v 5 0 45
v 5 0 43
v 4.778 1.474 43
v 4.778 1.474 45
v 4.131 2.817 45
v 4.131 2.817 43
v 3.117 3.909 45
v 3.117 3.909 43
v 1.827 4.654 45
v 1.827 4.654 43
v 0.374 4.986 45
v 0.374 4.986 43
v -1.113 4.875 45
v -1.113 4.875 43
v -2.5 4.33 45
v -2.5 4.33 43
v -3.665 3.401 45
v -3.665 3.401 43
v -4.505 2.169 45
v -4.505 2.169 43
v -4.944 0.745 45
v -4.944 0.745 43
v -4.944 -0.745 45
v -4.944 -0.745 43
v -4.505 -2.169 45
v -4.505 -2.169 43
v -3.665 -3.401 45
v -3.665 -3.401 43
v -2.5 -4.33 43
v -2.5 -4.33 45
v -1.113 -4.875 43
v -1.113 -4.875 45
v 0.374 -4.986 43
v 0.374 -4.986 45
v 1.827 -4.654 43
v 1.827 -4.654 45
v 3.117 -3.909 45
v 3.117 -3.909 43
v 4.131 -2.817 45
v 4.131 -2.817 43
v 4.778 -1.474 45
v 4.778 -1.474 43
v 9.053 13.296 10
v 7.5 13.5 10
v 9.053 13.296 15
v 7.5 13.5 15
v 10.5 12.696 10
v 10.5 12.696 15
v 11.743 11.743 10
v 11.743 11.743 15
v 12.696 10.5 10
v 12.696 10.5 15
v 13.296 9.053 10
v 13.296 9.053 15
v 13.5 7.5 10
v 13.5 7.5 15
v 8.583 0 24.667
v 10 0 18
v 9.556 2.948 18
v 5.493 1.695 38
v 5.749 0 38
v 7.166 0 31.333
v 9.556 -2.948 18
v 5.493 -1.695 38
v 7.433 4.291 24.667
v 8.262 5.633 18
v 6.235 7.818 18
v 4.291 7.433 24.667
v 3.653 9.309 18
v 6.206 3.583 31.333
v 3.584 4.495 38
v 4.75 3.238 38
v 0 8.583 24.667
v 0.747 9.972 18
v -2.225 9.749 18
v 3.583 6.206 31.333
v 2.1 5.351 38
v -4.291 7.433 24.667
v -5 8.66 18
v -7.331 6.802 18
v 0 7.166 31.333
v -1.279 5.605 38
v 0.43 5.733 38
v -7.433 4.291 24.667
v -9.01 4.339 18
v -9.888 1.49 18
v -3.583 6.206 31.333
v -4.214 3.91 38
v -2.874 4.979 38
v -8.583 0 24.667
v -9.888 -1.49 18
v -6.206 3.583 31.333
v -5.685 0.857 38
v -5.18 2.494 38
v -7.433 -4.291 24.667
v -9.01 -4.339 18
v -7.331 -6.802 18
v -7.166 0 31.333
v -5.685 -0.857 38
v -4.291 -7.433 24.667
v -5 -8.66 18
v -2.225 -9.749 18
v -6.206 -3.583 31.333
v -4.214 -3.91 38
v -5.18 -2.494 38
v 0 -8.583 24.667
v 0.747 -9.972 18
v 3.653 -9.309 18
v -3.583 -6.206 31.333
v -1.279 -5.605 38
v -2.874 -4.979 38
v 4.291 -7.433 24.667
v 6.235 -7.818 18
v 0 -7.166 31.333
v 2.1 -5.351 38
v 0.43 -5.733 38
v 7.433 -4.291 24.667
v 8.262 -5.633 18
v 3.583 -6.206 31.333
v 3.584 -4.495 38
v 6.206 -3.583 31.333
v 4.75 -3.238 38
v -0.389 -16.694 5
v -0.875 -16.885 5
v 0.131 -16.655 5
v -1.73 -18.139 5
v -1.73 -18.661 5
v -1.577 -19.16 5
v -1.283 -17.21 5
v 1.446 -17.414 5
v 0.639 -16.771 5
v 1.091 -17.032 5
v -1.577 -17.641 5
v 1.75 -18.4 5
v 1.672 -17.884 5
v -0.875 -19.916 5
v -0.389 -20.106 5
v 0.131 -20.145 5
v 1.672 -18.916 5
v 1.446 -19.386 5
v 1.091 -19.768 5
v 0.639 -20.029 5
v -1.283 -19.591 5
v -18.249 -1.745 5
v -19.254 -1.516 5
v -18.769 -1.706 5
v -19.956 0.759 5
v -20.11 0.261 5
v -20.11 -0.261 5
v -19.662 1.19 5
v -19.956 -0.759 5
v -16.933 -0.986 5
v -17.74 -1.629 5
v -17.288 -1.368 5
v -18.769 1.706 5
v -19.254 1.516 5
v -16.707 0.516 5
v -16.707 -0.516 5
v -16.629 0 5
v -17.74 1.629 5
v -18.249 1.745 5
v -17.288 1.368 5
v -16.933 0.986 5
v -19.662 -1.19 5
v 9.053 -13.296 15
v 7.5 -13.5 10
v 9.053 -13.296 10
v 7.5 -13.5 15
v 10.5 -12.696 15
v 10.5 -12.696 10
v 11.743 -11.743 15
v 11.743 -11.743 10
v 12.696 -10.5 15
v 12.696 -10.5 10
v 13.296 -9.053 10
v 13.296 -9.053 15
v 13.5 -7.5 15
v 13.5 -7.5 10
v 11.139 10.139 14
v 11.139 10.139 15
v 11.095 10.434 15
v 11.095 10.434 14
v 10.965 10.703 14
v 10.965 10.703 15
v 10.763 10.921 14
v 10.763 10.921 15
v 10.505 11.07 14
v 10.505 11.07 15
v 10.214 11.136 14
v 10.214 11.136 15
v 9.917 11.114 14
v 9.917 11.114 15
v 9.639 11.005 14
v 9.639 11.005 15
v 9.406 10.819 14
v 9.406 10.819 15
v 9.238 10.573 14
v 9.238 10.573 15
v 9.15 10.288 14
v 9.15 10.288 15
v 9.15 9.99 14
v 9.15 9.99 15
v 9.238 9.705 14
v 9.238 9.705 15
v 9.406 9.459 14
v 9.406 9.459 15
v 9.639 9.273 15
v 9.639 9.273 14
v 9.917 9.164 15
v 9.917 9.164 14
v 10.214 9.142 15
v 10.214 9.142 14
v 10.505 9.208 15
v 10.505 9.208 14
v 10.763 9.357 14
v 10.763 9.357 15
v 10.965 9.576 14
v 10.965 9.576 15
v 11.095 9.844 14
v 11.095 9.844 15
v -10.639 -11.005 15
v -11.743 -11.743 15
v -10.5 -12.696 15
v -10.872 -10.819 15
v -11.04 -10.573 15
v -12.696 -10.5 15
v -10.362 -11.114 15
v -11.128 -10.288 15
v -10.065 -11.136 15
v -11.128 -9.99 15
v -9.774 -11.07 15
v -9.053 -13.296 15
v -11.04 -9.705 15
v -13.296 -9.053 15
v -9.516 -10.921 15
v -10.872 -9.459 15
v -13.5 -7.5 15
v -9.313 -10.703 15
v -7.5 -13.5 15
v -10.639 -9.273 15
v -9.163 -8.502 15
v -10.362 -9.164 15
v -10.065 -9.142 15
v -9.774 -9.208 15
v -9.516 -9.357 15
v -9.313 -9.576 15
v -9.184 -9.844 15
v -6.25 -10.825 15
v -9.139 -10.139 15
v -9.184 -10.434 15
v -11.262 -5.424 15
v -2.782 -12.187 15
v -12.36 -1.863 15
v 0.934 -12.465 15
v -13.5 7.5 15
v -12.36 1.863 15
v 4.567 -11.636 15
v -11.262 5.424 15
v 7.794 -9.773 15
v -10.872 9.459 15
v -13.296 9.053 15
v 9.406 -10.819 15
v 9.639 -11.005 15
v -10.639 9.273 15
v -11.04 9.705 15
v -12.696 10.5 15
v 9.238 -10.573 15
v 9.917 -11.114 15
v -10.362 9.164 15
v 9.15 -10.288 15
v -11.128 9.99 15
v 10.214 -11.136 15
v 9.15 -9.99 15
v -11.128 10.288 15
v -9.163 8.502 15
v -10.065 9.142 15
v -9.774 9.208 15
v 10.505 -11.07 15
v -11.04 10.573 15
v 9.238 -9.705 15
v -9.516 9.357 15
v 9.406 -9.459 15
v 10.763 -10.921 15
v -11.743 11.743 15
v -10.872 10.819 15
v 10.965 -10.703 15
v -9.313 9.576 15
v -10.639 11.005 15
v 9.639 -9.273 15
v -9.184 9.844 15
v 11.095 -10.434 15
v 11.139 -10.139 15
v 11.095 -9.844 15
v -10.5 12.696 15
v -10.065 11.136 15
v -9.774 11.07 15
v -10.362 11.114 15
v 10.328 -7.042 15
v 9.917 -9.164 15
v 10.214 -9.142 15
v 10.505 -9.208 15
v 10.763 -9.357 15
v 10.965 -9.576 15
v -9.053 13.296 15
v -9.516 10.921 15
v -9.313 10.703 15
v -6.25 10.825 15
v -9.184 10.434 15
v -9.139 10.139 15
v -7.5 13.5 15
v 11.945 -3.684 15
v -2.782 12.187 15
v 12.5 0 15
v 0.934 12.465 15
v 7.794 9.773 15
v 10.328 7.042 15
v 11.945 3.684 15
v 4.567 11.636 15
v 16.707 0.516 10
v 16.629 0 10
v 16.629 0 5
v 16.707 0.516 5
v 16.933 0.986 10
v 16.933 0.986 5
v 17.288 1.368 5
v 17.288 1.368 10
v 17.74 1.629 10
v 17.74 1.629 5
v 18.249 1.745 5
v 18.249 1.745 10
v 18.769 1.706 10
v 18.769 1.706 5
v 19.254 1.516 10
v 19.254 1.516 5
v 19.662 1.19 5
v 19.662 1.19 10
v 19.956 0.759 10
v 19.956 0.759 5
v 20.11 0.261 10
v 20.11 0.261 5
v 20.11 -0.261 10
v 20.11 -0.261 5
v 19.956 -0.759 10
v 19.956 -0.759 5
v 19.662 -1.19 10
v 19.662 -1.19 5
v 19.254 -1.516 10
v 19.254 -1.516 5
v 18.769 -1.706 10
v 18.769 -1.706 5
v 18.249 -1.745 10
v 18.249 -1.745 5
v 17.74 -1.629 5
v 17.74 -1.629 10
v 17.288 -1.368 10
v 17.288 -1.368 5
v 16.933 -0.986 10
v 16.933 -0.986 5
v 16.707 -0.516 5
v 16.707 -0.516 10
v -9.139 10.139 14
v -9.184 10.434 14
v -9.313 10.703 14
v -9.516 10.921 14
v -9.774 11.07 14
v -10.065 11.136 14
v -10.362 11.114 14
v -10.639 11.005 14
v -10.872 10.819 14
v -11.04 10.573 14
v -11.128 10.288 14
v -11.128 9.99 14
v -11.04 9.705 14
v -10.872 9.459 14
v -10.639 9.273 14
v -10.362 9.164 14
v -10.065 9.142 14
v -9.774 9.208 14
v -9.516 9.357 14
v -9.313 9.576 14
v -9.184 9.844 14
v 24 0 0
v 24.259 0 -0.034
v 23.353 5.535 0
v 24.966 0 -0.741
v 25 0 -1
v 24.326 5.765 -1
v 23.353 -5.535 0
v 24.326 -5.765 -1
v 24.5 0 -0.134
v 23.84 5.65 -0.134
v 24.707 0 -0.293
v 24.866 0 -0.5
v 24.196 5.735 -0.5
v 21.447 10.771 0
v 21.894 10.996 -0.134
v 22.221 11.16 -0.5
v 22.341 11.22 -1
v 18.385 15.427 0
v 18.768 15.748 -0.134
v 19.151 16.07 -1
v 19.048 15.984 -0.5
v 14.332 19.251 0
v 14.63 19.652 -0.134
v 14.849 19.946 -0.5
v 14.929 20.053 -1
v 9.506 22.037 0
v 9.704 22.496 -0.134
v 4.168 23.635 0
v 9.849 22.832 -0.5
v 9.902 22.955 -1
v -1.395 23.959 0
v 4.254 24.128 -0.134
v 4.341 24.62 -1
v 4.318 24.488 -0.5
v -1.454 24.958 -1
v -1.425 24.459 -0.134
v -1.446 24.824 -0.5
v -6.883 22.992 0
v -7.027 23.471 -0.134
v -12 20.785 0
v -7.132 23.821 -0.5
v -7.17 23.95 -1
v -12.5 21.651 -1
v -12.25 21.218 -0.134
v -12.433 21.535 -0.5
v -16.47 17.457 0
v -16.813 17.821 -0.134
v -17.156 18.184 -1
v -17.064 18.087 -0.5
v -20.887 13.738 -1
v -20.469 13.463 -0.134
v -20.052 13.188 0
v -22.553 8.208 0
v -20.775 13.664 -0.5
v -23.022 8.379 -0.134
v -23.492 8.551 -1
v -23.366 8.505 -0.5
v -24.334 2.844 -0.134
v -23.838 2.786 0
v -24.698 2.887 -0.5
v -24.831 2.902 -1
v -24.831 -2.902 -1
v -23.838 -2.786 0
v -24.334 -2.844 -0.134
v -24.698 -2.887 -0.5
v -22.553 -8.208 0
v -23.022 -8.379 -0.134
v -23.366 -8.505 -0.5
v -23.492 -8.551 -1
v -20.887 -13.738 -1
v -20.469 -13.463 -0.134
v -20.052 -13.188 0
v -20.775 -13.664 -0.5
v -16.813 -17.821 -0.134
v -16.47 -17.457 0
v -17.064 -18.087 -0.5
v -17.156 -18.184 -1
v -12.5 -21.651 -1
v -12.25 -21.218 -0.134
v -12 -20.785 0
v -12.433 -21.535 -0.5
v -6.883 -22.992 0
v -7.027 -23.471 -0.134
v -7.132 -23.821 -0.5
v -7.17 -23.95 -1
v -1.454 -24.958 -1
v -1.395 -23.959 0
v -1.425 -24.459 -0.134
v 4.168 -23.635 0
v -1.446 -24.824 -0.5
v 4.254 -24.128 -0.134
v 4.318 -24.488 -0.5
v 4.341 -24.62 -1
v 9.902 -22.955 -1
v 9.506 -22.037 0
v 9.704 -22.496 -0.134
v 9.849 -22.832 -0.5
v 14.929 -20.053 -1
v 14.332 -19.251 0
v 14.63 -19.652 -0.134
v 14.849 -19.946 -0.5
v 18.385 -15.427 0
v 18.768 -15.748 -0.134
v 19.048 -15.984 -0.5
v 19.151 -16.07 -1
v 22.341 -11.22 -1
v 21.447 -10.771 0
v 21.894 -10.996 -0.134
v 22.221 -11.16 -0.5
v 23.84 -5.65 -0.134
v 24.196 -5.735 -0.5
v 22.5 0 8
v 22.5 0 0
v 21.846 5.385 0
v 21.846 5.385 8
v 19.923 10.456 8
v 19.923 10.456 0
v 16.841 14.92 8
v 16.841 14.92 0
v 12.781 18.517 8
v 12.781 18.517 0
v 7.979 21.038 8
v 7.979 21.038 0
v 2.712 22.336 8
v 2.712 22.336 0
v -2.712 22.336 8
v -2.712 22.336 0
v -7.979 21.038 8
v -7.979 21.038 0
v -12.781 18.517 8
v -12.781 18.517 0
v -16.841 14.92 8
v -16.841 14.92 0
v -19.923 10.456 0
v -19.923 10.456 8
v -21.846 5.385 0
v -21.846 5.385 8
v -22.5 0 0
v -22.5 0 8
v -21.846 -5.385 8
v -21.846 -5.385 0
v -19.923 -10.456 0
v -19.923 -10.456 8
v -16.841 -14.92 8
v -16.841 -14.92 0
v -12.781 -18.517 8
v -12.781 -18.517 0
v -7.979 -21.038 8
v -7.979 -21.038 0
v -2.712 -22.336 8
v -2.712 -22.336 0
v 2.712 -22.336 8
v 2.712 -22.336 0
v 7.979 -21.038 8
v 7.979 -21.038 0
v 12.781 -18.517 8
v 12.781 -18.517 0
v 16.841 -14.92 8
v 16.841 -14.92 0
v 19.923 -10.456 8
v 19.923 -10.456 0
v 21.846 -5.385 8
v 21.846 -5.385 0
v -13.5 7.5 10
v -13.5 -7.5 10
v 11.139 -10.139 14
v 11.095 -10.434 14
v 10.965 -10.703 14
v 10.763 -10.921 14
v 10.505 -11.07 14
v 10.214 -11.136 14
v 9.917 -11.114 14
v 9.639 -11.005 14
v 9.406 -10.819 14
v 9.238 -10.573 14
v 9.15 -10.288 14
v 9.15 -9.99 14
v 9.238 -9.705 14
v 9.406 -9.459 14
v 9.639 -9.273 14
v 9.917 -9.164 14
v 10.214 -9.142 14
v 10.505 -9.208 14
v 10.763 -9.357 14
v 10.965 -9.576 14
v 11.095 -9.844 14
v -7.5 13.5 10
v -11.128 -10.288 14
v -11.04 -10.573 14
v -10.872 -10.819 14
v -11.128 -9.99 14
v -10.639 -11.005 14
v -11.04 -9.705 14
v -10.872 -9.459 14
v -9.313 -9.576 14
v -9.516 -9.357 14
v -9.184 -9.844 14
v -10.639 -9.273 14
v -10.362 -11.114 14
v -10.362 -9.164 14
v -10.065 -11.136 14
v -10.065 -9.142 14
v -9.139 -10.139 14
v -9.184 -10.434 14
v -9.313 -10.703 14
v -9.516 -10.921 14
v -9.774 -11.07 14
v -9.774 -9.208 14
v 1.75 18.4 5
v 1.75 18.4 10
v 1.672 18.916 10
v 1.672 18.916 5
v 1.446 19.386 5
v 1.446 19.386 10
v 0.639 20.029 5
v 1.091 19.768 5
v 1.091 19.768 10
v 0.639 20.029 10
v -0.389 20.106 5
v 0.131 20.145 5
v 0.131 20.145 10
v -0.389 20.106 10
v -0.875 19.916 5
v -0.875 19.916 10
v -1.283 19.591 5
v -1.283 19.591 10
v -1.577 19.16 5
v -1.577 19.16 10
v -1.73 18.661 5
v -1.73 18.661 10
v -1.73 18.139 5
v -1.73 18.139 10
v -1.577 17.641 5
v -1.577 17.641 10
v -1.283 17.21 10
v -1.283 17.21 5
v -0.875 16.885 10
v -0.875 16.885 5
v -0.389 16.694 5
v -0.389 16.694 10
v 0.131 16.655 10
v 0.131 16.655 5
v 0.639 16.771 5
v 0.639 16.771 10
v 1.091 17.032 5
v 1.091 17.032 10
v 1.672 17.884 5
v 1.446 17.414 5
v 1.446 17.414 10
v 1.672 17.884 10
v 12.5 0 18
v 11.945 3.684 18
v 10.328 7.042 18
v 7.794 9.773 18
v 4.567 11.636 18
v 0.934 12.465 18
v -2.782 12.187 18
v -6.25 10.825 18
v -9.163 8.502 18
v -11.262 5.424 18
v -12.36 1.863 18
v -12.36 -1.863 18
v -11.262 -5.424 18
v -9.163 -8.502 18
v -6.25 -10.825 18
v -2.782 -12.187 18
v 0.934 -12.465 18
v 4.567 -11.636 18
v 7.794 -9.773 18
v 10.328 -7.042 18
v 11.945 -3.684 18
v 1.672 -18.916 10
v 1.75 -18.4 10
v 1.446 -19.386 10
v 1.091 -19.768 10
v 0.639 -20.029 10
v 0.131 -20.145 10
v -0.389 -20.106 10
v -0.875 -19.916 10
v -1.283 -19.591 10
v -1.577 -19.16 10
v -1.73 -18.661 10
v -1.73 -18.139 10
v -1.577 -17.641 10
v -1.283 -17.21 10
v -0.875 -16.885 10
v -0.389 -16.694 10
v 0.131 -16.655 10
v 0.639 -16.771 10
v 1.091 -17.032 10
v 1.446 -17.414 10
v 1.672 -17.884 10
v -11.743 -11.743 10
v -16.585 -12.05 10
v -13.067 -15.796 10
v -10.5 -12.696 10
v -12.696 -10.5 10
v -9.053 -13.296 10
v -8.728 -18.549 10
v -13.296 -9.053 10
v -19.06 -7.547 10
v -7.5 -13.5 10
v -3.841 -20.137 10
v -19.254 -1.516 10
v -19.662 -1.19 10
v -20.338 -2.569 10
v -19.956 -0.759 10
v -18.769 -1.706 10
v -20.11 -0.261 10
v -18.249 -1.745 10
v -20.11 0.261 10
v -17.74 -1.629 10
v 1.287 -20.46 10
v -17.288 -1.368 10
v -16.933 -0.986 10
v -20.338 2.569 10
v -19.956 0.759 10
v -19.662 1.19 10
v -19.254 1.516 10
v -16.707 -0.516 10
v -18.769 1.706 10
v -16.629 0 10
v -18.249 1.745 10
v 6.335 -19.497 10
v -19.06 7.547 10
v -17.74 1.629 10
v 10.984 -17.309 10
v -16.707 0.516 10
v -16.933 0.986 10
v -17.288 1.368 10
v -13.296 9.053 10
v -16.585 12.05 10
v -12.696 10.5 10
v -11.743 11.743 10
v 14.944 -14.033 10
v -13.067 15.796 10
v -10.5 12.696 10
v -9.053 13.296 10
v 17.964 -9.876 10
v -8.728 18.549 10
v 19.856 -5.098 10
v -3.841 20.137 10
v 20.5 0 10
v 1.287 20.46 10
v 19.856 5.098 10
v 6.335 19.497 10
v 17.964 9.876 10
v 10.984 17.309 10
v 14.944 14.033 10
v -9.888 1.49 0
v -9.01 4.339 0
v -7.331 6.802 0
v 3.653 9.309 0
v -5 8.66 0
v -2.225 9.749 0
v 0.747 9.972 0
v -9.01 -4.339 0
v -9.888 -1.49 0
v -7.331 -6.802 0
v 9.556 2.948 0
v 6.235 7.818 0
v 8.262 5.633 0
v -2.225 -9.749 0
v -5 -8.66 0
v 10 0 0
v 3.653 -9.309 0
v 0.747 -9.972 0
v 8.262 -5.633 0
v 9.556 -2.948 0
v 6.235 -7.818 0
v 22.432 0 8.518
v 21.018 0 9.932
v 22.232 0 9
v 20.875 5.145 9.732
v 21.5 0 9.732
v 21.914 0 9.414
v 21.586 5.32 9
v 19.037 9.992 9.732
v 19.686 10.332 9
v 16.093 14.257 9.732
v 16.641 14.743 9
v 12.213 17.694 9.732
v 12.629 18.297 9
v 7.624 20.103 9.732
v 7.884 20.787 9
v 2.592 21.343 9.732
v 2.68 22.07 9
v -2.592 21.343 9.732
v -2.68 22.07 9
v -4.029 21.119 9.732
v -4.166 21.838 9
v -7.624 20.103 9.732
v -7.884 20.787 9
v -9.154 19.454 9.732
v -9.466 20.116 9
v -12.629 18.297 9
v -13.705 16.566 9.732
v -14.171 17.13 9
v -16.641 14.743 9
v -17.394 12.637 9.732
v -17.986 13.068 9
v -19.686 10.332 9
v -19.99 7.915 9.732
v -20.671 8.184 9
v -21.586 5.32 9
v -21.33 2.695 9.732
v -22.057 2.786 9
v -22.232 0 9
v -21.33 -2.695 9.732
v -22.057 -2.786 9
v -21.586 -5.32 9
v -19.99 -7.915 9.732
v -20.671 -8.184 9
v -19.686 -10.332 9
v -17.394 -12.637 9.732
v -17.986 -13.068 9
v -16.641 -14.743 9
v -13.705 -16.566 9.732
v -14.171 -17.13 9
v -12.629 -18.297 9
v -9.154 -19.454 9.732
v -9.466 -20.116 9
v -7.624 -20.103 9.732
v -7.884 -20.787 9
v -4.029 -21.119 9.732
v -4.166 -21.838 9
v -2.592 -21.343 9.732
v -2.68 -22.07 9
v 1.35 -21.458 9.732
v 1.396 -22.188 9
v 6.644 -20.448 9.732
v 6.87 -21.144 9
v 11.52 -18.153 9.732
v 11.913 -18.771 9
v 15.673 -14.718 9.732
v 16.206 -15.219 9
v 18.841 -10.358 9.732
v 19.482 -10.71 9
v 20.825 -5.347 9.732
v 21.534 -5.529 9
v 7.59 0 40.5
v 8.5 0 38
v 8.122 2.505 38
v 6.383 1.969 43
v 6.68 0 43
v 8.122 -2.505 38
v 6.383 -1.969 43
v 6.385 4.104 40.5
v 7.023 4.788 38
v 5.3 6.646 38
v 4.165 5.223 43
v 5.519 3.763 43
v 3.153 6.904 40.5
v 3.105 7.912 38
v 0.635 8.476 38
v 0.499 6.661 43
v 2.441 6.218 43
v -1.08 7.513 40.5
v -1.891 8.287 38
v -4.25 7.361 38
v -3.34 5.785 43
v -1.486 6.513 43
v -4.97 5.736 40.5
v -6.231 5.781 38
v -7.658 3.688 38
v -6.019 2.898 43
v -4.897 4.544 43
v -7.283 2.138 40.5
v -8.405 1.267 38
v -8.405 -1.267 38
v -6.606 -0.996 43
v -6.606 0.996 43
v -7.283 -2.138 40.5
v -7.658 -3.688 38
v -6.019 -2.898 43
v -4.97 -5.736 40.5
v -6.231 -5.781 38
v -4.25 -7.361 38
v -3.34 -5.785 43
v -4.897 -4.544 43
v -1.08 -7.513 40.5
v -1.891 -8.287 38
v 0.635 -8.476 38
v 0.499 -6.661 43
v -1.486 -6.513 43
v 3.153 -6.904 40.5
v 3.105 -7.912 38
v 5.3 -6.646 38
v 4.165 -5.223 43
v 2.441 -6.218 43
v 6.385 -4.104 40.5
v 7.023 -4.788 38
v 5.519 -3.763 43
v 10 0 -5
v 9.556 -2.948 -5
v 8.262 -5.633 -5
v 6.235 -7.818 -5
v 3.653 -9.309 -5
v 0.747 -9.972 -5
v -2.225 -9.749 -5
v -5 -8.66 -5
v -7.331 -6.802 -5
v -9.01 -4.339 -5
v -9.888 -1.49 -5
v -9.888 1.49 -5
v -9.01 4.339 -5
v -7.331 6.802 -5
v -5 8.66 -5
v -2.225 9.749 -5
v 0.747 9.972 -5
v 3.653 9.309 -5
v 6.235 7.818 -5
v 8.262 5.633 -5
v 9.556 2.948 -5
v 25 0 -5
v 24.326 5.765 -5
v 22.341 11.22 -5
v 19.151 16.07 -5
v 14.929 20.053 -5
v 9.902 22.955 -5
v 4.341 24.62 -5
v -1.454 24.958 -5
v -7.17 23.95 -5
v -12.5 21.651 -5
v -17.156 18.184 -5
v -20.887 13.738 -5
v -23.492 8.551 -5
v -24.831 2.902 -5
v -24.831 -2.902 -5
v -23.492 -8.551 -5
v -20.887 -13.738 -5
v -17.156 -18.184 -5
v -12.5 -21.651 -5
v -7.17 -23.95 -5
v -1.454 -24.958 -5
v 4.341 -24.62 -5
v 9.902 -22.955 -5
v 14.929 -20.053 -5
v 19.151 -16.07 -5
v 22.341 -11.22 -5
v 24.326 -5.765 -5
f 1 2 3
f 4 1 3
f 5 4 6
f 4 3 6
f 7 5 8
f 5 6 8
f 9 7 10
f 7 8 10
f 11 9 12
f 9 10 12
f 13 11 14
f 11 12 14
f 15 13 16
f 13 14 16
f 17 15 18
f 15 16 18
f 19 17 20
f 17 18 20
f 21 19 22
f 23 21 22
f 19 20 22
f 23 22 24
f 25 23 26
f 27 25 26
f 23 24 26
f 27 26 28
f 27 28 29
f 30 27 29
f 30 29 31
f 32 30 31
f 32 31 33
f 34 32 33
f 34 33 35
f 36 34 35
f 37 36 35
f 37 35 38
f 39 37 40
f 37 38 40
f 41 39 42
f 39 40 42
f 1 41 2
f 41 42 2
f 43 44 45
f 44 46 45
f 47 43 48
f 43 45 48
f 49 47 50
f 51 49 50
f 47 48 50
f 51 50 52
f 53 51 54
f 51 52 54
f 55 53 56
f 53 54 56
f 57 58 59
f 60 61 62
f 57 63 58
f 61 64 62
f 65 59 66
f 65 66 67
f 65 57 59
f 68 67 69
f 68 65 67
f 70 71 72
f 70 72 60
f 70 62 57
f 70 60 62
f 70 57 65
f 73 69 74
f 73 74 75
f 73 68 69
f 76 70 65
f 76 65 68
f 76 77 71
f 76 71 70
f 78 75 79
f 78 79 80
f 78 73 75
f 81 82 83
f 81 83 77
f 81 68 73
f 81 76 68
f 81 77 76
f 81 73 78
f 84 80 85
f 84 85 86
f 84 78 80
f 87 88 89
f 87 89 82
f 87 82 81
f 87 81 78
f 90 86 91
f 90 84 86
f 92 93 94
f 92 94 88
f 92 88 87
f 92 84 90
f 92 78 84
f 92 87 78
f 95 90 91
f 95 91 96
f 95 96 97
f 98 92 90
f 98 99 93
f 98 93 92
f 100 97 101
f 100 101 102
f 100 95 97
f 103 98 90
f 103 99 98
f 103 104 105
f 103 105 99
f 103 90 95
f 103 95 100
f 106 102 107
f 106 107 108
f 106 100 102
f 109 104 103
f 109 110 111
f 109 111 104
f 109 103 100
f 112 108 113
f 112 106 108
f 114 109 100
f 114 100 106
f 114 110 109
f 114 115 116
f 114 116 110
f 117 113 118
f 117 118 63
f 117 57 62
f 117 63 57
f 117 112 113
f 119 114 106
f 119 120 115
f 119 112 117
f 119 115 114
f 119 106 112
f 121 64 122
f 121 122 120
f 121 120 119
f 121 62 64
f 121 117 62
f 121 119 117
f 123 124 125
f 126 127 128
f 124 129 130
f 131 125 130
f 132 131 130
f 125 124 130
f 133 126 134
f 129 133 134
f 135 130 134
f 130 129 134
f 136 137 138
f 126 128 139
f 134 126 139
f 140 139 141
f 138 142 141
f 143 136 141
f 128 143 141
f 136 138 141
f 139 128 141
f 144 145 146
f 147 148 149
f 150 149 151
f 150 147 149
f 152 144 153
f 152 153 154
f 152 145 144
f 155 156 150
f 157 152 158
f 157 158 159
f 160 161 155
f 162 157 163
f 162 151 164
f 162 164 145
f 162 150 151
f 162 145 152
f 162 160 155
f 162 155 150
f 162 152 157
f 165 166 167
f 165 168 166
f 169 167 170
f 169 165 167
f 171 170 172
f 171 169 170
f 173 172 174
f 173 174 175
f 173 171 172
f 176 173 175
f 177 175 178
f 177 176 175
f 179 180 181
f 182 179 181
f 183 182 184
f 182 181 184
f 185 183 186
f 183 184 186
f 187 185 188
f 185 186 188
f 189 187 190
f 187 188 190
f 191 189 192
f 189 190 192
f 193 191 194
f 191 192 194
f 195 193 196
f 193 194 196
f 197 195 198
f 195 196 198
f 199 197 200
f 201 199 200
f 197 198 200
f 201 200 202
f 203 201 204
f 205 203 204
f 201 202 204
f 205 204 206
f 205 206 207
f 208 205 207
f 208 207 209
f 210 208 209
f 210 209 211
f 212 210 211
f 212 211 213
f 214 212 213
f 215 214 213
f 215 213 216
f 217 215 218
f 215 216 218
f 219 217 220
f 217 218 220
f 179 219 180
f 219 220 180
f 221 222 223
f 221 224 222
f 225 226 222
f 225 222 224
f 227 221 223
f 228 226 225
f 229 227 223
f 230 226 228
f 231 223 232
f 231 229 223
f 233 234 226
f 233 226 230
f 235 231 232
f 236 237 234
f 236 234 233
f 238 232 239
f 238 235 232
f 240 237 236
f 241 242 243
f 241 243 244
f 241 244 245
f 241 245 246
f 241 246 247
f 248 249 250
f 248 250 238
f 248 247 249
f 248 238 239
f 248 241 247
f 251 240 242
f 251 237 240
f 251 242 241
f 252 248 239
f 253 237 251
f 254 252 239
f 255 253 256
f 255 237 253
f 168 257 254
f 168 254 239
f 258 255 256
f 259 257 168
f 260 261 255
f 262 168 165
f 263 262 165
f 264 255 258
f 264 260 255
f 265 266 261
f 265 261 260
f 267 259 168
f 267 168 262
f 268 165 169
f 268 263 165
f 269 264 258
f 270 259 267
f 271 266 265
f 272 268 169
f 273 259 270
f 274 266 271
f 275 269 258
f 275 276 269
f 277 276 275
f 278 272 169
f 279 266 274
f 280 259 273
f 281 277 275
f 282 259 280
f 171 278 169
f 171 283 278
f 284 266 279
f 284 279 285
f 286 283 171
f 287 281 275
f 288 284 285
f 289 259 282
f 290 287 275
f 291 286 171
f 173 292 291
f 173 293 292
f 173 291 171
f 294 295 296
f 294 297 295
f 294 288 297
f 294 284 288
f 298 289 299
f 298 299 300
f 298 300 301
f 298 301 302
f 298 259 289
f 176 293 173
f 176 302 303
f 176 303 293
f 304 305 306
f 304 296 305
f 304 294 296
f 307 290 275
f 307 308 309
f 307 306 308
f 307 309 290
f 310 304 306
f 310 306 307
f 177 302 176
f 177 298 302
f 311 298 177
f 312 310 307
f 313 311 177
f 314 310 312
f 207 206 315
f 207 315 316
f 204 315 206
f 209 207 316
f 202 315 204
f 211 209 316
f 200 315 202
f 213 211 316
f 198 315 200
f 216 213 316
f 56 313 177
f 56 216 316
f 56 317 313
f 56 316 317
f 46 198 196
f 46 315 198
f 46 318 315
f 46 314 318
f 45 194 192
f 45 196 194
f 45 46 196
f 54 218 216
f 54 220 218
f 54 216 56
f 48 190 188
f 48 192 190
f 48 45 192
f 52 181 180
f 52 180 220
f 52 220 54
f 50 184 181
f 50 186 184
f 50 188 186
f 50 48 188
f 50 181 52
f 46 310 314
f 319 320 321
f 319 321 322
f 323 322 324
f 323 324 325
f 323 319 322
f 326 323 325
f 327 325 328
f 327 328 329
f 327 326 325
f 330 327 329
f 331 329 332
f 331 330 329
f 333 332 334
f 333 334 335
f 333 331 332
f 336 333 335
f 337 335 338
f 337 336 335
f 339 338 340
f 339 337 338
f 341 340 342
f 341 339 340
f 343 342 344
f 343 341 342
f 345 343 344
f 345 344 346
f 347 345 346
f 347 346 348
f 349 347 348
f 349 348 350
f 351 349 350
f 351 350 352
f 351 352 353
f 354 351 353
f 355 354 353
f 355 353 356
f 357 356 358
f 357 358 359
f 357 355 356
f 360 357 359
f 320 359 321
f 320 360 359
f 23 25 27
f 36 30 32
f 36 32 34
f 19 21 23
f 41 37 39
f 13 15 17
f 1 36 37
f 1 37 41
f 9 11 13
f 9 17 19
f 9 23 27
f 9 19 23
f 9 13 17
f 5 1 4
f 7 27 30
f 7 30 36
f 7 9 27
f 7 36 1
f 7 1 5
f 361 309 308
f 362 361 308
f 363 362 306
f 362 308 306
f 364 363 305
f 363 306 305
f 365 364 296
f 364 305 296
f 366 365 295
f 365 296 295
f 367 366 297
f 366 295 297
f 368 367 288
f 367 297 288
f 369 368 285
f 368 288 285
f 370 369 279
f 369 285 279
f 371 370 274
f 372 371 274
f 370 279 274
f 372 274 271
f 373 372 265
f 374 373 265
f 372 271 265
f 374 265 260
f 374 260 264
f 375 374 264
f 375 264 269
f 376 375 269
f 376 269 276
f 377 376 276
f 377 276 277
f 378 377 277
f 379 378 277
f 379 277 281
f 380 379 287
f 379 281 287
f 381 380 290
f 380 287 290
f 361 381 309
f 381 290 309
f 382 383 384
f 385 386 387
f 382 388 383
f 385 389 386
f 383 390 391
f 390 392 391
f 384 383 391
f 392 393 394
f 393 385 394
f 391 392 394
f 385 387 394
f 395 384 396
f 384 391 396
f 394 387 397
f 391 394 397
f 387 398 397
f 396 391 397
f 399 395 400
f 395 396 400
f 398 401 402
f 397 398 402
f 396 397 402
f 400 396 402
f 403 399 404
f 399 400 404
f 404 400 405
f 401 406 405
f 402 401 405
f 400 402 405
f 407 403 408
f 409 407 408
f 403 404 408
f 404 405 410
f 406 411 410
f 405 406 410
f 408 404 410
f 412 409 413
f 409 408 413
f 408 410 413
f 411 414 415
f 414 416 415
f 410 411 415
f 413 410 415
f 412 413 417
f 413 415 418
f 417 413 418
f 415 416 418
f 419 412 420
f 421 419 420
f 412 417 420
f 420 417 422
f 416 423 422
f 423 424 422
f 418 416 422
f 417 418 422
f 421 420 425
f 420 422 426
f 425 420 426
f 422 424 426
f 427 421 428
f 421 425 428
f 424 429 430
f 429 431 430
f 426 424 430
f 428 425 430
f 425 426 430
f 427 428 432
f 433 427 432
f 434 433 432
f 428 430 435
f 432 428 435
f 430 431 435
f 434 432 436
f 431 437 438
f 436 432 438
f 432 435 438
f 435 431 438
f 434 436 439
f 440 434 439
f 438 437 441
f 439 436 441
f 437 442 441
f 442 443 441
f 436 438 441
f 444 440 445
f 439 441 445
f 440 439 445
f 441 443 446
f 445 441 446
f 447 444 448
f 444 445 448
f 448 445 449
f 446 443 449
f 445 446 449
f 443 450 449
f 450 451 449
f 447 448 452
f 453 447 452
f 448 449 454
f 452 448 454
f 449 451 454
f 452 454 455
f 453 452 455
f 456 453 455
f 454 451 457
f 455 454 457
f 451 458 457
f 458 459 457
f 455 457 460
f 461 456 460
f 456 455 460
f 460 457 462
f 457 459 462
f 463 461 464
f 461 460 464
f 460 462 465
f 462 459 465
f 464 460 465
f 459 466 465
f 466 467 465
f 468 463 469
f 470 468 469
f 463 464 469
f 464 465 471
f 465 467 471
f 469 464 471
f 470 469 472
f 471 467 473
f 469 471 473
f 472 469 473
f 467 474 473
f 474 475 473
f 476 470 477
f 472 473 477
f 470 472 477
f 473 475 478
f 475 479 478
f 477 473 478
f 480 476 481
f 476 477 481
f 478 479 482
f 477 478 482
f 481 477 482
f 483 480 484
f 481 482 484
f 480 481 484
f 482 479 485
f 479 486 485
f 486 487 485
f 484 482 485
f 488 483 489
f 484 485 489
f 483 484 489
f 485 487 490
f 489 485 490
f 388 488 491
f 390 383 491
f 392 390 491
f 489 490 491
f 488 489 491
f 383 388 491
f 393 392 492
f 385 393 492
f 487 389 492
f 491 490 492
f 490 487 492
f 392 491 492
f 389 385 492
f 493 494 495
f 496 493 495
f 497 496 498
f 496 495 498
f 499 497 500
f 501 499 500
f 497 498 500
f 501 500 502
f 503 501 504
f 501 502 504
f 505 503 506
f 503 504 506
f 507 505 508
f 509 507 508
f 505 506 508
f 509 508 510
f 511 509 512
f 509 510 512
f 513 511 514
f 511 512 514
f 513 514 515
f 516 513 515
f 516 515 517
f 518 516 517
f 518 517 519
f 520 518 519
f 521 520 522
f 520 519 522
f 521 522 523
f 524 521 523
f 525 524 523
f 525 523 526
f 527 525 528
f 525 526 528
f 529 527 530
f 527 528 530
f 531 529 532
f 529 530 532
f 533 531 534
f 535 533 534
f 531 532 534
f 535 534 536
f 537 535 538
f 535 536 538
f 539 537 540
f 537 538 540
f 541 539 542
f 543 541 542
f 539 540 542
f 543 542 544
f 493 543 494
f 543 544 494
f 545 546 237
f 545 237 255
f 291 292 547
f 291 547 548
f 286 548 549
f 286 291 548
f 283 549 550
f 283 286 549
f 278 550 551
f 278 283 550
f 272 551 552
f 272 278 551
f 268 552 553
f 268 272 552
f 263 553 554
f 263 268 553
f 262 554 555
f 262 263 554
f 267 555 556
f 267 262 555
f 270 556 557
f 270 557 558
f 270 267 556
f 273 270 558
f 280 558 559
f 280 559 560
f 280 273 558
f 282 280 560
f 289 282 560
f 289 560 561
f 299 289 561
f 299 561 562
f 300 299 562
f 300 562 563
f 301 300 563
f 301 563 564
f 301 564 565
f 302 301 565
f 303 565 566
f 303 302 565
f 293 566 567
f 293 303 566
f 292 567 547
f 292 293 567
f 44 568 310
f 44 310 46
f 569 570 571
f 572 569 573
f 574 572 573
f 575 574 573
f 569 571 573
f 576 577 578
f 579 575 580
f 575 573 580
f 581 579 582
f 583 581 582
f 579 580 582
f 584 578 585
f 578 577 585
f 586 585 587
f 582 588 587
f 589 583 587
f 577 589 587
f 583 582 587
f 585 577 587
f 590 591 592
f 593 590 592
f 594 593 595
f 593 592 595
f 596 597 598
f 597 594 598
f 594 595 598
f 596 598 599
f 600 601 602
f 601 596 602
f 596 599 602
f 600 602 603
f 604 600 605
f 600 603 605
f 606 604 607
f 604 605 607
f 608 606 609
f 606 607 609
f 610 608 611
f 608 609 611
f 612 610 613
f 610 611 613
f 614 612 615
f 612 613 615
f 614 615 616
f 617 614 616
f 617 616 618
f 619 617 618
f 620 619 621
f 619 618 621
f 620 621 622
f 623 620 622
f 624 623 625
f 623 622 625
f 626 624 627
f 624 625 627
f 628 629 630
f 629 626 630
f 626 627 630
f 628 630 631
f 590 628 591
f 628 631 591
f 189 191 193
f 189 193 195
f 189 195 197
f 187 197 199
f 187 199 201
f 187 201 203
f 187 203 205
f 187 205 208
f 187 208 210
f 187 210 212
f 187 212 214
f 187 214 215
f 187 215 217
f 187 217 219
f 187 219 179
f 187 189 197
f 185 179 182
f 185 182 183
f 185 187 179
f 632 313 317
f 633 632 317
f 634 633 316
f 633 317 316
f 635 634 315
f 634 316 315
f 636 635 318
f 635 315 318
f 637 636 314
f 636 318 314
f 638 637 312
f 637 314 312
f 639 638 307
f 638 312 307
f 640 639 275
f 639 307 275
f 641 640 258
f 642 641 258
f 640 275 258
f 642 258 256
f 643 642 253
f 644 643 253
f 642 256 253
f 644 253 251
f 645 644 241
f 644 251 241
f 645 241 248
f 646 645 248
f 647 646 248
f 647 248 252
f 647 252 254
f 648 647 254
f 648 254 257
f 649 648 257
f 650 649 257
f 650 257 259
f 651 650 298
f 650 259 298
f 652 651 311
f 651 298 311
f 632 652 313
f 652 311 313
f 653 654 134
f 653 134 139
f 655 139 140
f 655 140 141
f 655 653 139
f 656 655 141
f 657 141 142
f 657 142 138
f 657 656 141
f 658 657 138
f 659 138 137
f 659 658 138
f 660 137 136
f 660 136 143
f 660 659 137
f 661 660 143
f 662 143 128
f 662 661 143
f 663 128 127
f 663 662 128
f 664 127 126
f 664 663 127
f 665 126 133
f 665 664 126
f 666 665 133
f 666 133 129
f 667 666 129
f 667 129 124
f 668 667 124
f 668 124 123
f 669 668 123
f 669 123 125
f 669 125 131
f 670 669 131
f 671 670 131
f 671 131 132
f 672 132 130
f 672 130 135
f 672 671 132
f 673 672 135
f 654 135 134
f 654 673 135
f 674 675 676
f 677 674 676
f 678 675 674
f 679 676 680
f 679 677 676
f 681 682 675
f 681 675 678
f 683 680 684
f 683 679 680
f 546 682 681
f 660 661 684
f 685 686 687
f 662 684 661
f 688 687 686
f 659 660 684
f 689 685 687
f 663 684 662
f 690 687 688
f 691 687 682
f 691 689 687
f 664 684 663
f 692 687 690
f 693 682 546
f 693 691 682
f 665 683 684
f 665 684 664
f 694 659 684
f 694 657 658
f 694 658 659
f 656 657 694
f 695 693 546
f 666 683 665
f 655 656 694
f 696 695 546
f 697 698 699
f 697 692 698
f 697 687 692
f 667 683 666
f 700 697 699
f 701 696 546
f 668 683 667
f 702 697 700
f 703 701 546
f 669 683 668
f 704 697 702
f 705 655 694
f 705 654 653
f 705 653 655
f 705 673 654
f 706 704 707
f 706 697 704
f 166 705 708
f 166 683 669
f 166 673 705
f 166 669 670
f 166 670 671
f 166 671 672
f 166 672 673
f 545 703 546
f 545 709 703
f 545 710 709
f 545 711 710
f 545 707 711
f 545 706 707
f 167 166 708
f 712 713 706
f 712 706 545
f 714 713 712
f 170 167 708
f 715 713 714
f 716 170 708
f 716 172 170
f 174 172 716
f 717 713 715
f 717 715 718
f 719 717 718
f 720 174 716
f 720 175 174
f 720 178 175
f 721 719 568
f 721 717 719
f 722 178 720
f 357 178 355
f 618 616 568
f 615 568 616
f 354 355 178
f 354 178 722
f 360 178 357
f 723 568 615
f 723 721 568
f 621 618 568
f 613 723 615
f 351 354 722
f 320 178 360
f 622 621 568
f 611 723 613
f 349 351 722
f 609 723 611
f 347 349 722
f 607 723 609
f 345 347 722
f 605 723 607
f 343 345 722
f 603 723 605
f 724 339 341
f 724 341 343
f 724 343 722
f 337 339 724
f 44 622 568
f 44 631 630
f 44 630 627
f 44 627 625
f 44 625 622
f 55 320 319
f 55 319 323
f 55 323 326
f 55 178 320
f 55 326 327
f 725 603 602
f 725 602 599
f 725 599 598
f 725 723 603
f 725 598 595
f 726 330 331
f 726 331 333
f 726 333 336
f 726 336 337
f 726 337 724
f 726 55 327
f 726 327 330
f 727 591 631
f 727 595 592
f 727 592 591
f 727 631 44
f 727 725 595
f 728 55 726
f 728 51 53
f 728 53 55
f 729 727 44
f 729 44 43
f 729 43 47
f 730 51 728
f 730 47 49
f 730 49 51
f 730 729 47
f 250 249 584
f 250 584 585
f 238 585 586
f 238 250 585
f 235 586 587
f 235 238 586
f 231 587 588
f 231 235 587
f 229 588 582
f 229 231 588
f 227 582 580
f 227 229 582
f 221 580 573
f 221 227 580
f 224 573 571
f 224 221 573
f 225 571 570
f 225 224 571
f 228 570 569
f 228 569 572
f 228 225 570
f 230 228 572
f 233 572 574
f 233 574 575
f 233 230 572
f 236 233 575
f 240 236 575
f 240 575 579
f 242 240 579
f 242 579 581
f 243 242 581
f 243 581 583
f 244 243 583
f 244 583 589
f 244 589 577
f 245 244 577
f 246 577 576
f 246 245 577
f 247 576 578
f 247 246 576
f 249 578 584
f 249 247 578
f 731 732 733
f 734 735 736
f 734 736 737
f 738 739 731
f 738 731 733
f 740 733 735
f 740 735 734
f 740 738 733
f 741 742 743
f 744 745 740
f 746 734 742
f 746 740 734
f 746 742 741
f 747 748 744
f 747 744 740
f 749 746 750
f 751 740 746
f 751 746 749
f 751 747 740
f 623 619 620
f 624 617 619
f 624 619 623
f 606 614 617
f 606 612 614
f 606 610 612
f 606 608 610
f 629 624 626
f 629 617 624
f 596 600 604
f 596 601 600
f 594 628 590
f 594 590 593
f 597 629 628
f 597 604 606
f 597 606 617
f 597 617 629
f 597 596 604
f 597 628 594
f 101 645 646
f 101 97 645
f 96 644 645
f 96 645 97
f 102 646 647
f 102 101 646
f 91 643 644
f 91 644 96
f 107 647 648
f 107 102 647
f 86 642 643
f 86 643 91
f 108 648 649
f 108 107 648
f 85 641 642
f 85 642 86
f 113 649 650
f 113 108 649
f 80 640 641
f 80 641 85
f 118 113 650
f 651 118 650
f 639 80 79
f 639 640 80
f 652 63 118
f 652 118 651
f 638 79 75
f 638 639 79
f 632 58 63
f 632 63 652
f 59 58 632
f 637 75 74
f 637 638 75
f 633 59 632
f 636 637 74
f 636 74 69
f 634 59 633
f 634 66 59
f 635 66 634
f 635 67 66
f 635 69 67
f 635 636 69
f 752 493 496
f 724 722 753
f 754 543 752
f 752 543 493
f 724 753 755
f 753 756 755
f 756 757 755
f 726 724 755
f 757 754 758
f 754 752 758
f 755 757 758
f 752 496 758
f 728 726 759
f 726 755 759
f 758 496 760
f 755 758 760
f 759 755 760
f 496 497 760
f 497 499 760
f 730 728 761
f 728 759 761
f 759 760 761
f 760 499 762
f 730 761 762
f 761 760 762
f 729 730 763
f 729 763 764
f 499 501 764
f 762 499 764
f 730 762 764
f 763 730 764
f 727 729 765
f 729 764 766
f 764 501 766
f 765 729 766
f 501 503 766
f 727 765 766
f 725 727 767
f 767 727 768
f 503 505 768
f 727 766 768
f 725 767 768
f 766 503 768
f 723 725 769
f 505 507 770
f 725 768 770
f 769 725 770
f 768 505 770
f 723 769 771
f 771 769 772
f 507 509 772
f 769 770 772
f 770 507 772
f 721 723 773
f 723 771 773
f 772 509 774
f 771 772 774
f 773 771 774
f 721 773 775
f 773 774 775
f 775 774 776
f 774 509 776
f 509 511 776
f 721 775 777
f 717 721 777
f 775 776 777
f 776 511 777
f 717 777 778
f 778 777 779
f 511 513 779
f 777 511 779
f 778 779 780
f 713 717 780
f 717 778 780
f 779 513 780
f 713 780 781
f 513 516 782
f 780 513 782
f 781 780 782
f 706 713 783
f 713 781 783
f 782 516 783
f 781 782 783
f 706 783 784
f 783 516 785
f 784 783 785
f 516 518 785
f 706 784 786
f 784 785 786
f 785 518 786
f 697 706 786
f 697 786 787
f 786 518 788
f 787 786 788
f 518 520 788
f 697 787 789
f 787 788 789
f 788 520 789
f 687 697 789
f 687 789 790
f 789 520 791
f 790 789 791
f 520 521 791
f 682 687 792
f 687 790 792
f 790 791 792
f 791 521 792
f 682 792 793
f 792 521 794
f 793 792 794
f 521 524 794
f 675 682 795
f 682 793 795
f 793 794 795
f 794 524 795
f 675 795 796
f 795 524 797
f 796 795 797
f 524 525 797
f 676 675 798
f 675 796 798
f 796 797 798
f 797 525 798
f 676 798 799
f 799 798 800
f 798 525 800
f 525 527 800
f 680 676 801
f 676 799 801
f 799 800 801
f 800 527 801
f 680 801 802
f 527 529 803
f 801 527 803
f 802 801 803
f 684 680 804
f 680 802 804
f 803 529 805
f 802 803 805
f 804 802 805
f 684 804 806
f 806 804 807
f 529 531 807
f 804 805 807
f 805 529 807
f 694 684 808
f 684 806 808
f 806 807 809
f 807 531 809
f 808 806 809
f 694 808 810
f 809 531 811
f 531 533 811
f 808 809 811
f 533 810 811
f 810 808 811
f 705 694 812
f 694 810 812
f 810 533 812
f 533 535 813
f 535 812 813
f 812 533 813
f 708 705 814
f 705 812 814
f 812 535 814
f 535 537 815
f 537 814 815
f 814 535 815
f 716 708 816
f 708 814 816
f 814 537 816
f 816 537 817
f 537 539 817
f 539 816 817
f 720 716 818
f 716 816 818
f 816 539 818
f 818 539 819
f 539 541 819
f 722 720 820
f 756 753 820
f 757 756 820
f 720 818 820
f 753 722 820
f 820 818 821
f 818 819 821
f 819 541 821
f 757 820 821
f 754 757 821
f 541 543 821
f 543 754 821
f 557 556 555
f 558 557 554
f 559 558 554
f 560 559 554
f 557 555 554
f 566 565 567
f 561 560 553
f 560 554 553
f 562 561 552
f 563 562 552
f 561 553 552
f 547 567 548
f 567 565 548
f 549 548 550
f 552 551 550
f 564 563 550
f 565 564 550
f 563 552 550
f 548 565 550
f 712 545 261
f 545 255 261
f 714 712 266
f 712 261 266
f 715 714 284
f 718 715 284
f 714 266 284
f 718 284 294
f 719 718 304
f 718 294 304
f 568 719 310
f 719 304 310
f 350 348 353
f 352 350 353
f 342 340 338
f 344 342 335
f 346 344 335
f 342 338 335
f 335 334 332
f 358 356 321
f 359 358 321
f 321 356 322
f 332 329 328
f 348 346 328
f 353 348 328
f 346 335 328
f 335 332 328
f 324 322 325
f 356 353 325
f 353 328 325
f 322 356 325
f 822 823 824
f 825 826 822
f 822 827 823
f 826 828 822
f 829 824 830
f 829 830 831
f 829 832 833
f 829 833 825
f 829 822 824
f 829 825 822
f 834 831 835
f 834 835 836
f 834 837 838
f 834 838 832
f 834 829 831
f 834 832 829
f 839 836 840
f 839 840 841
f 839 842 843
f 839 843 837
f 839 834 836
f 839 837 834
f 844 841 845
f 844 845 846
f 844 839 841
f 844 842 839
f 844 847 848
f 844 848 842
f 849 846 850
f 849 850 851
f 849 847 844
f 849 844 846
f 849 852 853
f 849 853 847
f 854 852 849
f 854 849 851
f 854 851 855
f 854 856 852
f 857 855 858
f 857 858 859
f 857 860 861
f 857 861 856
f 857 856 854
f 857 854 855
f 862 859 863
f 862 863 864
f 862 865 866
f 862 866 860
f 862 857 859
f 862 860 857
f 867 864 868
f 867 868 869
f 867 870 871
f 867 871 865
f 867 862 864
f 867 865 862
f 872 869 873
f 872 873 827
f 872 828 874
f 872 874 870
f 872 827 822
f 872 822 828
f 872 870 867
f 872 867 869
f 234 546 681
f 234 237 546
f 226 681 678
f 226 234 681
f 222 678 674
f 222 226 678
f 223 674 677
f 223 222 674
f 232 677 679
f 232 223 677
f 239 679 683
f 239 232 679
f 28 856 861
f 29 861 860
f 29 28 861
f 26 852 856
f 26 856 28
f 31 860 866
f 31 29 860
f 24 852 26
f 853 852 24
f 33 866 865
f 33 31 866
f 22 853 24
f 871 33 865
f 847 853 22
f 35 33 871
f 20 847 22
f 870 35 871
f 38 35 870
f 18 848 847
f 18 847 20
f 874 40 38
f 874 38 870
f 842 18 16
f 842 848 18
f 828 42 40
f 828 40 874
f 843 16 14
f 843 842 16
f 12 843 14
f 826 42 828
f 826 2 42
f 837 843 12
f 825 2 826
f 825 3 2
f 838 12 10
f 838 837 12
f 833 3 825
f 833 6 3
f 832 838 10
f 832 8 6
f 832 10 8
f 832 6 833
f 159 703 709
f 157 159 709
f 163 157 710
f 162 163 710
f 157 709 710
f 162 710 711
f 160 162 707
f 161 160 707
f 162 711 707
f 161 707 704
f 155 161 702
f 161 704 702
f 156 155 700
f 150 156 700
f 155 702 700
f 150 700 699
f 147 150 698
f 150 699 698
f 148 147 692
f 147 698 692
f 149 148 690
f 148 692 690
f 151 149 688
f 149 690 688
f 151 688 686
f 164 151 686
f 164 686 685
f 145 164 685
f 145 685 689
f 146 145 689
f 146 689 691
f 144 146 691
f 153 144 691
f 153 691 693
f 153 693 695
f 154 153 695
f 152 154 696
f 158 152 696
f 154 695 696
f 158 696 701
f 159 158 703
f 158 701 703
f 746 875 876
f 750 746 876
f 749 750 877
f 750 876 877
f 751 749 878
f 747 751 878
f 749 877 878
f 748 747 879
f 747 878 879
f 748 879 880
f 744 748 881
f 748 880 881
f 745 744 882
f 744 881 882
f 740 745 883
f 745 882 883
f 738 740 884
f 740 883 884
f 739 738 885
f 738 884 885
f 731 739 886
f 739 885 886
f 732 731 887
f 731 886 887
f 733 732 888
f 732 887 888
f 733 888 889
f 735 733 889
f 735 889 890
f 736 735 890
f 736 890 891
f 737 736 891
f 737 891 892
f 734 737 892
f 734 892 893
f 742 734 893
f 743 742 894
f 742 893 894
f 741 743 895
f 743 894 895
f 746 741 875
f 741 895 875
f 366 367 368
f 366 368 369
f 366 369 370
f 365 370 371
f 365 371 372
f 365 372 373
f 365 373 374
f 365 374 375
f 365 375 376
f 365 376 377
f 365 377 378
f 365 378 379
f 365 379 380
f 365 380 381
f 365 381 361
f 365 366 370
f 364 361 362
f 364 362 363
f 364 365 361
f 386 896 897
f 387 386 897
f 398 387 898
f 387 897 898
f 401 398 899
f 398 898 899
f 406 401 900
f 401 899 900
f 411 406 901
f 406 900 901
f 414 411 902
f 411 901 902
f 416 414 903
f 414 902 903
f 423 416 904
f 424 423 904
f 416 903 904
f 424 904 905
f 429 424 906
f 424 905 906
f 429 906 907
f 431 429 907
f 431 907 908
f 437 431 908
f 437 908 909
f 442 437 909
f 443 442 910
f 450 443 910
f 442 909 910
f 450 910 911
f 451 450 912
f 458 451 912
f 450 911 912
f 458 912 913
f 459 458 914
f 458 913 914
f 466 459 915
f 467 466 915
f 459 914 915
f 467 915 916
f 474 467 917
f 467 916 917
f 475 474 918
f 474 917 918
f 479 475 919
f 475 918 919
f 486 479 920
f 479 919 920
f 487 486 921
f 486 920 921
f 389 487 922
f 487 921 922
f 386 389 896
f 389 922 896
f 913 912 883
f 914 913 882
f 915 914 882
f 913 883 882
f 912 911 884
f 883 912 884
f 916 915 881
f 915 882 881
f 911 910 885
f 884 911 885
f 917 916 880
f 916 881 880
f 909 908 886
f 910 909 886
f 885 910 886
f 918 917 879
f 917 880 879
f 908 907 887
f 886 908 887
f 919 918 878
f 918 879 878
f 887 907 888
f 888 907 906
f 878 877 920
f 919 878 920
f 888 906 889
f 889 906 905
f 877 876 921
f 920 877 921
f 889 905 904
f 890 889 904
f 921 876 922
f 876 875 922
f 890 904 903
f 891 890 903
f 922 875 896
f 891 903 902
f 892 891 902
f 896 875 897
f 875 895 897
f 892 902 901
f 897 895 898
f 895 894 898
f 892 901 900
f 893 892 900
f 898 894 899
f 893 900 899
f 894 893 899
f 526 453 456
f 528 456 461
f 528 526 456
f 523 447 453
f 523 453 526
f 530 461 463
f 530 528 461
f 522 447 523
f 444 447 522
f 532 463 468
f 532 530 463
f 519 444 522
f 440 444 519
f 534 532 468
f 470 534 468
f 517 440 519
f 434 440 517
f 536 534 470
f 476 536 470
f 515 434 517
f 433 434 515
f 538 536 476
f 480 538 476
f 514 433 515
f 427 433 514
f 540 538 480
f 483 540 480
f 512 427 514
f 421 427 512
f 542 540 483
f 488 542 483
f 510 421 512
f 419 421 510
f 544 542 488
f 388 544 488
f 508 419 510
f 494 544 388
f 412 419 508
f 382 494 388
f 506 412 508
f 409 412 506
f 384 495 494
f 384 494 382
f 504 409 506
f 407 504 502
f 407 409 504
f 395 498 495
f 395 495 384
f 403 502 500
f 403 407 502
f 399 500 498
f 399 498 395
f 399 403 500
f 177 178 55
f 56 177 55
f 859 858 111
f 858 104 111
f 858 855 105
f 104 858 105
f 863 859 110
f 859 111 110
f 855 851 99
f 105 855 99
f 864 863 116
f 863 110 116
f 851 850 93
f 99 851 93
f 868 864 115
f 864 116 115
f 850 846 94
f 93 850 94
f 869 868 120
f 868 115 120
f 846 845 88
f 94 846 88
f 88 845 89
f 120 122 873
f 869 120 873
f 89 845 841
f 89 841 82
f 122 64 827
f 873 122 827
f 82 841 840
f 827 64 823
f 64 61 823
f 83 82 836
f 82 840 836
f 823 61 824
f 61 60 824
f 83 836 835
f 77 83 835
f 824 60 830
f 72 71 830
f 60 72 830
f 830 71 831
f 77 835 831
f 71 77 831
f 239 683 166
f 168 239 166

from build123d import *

# Parameters (mm, degrees)
SKETCH1_R             = 25
BOSS_EXTRUDE1_DEPTH   = 5
SKETCH2_R             = 22.5
BOSS_EXTRUDE2_DEPTH   = 10
SKETCH3_W             = 27
SKETCH3_H             = 27
BOSS_EXTRUDE3_DEPTH   = 5
SKETCH5_R             = 12.5
BOSS_EXTRUDE4_DEPTH   = 3
SKETCH6_R             = 10
BOSS_EXTRUDE5_DEPTH   = 20
BOSS_EXTRUDE5_TAPER   = 12
SKETCH7_R             = 8.5
BOSS_EXTRUDE6_DEPTH   = 5
BOSS_EXTRUDE6_TAPER   = 20
SKETCH8_R             = 5
BOSS_EXTRUDE7_DEPTH   = 2
FILLET1_R             = 6
SKETCH10_R            = 1.75
CUT_EXTRUDE2_DEPTH    = 5
SKETCH11_R            = 1
CUT_EXTRUDE3_DEPTH    = 1
SKETCH12_R            = 10
CUT_EXTRUDE4_DEPTH    = 5
FILLET2_R             = 2
FILLET3_R             = 1
BODY_MOVE_COPY2_ANGLE = 90


with BuildPart() as part:
    # Sketch1 → Boss-Extrude1 (new body)
    with BuildSketch(Plane(origin=(0, 0, 0), x_dir=(1, 0, 0), z_dir=(0, 1, 0))):
        Circle(SKETCH1_R)
    extrude(amount=BOSS_EXTRUDE1_DEPTH)

    # Sketch2 → Boss-Extrude2 (add)
    with BuildSketch(Plane(origin=(0, 5, 0), x_dir=(1, 0, 0), z_dir=(0, 1, 0))):
        Circle(SKETCH2_R)
    extrude(amount=BOSS_EXTRUDE2_DEPTH)

    # Sketch3 → Boss-Extrude3 (add)
    with BuildSketch(Plane(origin=(0, 15, 0), x_dir=(1, 0, 0), z_dir=(0, 1, 0))):
        Rectangle(SKETCH3_W, SKETCH3_H)
    extrude(amount=BOSS_EXTRUDE3_DEPTH)

    # Sketch5 → Boss-Extrude4 (add)
    with BuildSketch(Plane(origin=(0, 20, 0), x_dir=(1, 0, 0), z_dir=(0, 1, 0))):
        Circle(SKETCH5_R)
    extrude(amount=BOSS_EXTRUDE4_DEPTH)

    # Sketch6 → Boss-Extrude5 (add)
    with BuildSketch(Plane(origin=(0, 23, 0), x_dir=(1, 0, 0), z_dir=(0, 1, 0))):
        Circle(SKETCH6_R)
    extrude(amount=BOSS_EXTRUDE5_DEPTH, taper=BOSS_EXTRUDE5_TAPER)

    # Sketch7 → Boss-Extrude6 (add)
    with BuildSketch(Plane(origin=(0, 43, 0), x_dir=(1, 0, 0), z_dir=(0, 1, 0))):
        Circle(SKETCH7_R)
    extrude(amount=BOSS_EXTRUDE6_DEPTH, taper=BOSS_EXTRUDE6_TAPER)

    # Sketch8 → Boss-Extrude7 (add)
    with BuildSketch(Plane(origin=(0, 48, 0), x_dir=(1, 0, 0), z_dir=(0, 1, 0))):
        Circle(SKETCH8_R)
    extrude(amount=BOSS_EXTRUDE7_DEPTH)

    # Fillet1
    fillet1_edges = [part.edges().sort_by_distance(p)[0] for p in [
        (13.5, 17.5, 13.5),
        (13.5, 17.5, -13.5),
        (-13.5, 17.5, -13.5),
        (-13.5, 17.5, 13.5),
    ]]
    fillet(fillet1_edges, radius=FILLET1_R)

    # Sketch10 → Cut-Extrude2 (cut)
    with BuildSketch(Plane(origin=(0, 15, 0), x_dir=(1, 0, 0), z_dir=(0, 1, 0))):
        with Locations((-18.379384185, 0)):
            Circle(SKETCH10_R)
        with Locations((0, 18.400220003)):
            Circle(SKETCH10_R)
    cut_extrude2 = extrude(amount=-CUT_EXTRUDE2_DEPTH, mode=Mode.SUBTRACT)

    # Sketch11 → Cut-Extrude3 (cut)
    with BuildSketch(Plane(origin=(0, 20, 0), x_dir=(1, 0, 0), z_dir=(0, 1, 0))):
        with Locations((10.139251665, 10.139251665)):
            Circle(SKETCH11_R)
        with Locations((-10.139251665, 10.139251665)):
            Circle(SKETCH11_R)
    cut_extrude3 = extrude(amount=-CUT_EXTRUDE3_DEPTH, mode=Mode.SUBTRACT)

    # Mirror4: Cut-Extrude2, Cut-Extrude3 across plane
    add(cut_extrude2.mirror(Plane.XY), mode=Mode.SUBTRACT)
    add(cut_extrude3.mirror(Plane.XY), mode=Mode.SUBTRACT)

    # Mirror6: Cut-Extrude2 across plane
    add(cut_extrude2.mirror(Plane(origin=(0, 0, 0), x_dir=(0, 0, 1), z_dir=(1, 0, 0))), mode=Mode.SUBTRACT)

    # Sketch12 → Cut-Extrude4 (cut)
    with BuildSketch(Plane.XZ):
        Circle(SKETCH12_R)
    extrude(amount=-CUT_EXTRUDE4_DEPTH, mode=Mode.SUBTRACT)

    # Fillet2
    fillet2_edges = [part.edges().sort_by_distance(p)[0] for p in [
        (-22.5, 15, 0),
    ]]
    fillet(fillet2_edges, radius=FILLET2_R)

    # Fillet3
    fillet3_edges = [part.edges().sort_by_distance(p)[0] for p in [
        (-25, 5, 0),
    ]]
    fillet(fillet3_edges, radius=FILLET3_R)


with BuildPart() as part_1:
    # Body-Move/Copy1: moved
    add(part.part.moved(Location((0, -5, 0))))


with BuildPart() as part_2:
    # Body-Move/Copy2: moved
    add(part_1.part.rotate(Axis((0, 0, 0), (1, 0, 0)), BODY_MOVE_COPY2_ANGLE))


solid = part_2.part
